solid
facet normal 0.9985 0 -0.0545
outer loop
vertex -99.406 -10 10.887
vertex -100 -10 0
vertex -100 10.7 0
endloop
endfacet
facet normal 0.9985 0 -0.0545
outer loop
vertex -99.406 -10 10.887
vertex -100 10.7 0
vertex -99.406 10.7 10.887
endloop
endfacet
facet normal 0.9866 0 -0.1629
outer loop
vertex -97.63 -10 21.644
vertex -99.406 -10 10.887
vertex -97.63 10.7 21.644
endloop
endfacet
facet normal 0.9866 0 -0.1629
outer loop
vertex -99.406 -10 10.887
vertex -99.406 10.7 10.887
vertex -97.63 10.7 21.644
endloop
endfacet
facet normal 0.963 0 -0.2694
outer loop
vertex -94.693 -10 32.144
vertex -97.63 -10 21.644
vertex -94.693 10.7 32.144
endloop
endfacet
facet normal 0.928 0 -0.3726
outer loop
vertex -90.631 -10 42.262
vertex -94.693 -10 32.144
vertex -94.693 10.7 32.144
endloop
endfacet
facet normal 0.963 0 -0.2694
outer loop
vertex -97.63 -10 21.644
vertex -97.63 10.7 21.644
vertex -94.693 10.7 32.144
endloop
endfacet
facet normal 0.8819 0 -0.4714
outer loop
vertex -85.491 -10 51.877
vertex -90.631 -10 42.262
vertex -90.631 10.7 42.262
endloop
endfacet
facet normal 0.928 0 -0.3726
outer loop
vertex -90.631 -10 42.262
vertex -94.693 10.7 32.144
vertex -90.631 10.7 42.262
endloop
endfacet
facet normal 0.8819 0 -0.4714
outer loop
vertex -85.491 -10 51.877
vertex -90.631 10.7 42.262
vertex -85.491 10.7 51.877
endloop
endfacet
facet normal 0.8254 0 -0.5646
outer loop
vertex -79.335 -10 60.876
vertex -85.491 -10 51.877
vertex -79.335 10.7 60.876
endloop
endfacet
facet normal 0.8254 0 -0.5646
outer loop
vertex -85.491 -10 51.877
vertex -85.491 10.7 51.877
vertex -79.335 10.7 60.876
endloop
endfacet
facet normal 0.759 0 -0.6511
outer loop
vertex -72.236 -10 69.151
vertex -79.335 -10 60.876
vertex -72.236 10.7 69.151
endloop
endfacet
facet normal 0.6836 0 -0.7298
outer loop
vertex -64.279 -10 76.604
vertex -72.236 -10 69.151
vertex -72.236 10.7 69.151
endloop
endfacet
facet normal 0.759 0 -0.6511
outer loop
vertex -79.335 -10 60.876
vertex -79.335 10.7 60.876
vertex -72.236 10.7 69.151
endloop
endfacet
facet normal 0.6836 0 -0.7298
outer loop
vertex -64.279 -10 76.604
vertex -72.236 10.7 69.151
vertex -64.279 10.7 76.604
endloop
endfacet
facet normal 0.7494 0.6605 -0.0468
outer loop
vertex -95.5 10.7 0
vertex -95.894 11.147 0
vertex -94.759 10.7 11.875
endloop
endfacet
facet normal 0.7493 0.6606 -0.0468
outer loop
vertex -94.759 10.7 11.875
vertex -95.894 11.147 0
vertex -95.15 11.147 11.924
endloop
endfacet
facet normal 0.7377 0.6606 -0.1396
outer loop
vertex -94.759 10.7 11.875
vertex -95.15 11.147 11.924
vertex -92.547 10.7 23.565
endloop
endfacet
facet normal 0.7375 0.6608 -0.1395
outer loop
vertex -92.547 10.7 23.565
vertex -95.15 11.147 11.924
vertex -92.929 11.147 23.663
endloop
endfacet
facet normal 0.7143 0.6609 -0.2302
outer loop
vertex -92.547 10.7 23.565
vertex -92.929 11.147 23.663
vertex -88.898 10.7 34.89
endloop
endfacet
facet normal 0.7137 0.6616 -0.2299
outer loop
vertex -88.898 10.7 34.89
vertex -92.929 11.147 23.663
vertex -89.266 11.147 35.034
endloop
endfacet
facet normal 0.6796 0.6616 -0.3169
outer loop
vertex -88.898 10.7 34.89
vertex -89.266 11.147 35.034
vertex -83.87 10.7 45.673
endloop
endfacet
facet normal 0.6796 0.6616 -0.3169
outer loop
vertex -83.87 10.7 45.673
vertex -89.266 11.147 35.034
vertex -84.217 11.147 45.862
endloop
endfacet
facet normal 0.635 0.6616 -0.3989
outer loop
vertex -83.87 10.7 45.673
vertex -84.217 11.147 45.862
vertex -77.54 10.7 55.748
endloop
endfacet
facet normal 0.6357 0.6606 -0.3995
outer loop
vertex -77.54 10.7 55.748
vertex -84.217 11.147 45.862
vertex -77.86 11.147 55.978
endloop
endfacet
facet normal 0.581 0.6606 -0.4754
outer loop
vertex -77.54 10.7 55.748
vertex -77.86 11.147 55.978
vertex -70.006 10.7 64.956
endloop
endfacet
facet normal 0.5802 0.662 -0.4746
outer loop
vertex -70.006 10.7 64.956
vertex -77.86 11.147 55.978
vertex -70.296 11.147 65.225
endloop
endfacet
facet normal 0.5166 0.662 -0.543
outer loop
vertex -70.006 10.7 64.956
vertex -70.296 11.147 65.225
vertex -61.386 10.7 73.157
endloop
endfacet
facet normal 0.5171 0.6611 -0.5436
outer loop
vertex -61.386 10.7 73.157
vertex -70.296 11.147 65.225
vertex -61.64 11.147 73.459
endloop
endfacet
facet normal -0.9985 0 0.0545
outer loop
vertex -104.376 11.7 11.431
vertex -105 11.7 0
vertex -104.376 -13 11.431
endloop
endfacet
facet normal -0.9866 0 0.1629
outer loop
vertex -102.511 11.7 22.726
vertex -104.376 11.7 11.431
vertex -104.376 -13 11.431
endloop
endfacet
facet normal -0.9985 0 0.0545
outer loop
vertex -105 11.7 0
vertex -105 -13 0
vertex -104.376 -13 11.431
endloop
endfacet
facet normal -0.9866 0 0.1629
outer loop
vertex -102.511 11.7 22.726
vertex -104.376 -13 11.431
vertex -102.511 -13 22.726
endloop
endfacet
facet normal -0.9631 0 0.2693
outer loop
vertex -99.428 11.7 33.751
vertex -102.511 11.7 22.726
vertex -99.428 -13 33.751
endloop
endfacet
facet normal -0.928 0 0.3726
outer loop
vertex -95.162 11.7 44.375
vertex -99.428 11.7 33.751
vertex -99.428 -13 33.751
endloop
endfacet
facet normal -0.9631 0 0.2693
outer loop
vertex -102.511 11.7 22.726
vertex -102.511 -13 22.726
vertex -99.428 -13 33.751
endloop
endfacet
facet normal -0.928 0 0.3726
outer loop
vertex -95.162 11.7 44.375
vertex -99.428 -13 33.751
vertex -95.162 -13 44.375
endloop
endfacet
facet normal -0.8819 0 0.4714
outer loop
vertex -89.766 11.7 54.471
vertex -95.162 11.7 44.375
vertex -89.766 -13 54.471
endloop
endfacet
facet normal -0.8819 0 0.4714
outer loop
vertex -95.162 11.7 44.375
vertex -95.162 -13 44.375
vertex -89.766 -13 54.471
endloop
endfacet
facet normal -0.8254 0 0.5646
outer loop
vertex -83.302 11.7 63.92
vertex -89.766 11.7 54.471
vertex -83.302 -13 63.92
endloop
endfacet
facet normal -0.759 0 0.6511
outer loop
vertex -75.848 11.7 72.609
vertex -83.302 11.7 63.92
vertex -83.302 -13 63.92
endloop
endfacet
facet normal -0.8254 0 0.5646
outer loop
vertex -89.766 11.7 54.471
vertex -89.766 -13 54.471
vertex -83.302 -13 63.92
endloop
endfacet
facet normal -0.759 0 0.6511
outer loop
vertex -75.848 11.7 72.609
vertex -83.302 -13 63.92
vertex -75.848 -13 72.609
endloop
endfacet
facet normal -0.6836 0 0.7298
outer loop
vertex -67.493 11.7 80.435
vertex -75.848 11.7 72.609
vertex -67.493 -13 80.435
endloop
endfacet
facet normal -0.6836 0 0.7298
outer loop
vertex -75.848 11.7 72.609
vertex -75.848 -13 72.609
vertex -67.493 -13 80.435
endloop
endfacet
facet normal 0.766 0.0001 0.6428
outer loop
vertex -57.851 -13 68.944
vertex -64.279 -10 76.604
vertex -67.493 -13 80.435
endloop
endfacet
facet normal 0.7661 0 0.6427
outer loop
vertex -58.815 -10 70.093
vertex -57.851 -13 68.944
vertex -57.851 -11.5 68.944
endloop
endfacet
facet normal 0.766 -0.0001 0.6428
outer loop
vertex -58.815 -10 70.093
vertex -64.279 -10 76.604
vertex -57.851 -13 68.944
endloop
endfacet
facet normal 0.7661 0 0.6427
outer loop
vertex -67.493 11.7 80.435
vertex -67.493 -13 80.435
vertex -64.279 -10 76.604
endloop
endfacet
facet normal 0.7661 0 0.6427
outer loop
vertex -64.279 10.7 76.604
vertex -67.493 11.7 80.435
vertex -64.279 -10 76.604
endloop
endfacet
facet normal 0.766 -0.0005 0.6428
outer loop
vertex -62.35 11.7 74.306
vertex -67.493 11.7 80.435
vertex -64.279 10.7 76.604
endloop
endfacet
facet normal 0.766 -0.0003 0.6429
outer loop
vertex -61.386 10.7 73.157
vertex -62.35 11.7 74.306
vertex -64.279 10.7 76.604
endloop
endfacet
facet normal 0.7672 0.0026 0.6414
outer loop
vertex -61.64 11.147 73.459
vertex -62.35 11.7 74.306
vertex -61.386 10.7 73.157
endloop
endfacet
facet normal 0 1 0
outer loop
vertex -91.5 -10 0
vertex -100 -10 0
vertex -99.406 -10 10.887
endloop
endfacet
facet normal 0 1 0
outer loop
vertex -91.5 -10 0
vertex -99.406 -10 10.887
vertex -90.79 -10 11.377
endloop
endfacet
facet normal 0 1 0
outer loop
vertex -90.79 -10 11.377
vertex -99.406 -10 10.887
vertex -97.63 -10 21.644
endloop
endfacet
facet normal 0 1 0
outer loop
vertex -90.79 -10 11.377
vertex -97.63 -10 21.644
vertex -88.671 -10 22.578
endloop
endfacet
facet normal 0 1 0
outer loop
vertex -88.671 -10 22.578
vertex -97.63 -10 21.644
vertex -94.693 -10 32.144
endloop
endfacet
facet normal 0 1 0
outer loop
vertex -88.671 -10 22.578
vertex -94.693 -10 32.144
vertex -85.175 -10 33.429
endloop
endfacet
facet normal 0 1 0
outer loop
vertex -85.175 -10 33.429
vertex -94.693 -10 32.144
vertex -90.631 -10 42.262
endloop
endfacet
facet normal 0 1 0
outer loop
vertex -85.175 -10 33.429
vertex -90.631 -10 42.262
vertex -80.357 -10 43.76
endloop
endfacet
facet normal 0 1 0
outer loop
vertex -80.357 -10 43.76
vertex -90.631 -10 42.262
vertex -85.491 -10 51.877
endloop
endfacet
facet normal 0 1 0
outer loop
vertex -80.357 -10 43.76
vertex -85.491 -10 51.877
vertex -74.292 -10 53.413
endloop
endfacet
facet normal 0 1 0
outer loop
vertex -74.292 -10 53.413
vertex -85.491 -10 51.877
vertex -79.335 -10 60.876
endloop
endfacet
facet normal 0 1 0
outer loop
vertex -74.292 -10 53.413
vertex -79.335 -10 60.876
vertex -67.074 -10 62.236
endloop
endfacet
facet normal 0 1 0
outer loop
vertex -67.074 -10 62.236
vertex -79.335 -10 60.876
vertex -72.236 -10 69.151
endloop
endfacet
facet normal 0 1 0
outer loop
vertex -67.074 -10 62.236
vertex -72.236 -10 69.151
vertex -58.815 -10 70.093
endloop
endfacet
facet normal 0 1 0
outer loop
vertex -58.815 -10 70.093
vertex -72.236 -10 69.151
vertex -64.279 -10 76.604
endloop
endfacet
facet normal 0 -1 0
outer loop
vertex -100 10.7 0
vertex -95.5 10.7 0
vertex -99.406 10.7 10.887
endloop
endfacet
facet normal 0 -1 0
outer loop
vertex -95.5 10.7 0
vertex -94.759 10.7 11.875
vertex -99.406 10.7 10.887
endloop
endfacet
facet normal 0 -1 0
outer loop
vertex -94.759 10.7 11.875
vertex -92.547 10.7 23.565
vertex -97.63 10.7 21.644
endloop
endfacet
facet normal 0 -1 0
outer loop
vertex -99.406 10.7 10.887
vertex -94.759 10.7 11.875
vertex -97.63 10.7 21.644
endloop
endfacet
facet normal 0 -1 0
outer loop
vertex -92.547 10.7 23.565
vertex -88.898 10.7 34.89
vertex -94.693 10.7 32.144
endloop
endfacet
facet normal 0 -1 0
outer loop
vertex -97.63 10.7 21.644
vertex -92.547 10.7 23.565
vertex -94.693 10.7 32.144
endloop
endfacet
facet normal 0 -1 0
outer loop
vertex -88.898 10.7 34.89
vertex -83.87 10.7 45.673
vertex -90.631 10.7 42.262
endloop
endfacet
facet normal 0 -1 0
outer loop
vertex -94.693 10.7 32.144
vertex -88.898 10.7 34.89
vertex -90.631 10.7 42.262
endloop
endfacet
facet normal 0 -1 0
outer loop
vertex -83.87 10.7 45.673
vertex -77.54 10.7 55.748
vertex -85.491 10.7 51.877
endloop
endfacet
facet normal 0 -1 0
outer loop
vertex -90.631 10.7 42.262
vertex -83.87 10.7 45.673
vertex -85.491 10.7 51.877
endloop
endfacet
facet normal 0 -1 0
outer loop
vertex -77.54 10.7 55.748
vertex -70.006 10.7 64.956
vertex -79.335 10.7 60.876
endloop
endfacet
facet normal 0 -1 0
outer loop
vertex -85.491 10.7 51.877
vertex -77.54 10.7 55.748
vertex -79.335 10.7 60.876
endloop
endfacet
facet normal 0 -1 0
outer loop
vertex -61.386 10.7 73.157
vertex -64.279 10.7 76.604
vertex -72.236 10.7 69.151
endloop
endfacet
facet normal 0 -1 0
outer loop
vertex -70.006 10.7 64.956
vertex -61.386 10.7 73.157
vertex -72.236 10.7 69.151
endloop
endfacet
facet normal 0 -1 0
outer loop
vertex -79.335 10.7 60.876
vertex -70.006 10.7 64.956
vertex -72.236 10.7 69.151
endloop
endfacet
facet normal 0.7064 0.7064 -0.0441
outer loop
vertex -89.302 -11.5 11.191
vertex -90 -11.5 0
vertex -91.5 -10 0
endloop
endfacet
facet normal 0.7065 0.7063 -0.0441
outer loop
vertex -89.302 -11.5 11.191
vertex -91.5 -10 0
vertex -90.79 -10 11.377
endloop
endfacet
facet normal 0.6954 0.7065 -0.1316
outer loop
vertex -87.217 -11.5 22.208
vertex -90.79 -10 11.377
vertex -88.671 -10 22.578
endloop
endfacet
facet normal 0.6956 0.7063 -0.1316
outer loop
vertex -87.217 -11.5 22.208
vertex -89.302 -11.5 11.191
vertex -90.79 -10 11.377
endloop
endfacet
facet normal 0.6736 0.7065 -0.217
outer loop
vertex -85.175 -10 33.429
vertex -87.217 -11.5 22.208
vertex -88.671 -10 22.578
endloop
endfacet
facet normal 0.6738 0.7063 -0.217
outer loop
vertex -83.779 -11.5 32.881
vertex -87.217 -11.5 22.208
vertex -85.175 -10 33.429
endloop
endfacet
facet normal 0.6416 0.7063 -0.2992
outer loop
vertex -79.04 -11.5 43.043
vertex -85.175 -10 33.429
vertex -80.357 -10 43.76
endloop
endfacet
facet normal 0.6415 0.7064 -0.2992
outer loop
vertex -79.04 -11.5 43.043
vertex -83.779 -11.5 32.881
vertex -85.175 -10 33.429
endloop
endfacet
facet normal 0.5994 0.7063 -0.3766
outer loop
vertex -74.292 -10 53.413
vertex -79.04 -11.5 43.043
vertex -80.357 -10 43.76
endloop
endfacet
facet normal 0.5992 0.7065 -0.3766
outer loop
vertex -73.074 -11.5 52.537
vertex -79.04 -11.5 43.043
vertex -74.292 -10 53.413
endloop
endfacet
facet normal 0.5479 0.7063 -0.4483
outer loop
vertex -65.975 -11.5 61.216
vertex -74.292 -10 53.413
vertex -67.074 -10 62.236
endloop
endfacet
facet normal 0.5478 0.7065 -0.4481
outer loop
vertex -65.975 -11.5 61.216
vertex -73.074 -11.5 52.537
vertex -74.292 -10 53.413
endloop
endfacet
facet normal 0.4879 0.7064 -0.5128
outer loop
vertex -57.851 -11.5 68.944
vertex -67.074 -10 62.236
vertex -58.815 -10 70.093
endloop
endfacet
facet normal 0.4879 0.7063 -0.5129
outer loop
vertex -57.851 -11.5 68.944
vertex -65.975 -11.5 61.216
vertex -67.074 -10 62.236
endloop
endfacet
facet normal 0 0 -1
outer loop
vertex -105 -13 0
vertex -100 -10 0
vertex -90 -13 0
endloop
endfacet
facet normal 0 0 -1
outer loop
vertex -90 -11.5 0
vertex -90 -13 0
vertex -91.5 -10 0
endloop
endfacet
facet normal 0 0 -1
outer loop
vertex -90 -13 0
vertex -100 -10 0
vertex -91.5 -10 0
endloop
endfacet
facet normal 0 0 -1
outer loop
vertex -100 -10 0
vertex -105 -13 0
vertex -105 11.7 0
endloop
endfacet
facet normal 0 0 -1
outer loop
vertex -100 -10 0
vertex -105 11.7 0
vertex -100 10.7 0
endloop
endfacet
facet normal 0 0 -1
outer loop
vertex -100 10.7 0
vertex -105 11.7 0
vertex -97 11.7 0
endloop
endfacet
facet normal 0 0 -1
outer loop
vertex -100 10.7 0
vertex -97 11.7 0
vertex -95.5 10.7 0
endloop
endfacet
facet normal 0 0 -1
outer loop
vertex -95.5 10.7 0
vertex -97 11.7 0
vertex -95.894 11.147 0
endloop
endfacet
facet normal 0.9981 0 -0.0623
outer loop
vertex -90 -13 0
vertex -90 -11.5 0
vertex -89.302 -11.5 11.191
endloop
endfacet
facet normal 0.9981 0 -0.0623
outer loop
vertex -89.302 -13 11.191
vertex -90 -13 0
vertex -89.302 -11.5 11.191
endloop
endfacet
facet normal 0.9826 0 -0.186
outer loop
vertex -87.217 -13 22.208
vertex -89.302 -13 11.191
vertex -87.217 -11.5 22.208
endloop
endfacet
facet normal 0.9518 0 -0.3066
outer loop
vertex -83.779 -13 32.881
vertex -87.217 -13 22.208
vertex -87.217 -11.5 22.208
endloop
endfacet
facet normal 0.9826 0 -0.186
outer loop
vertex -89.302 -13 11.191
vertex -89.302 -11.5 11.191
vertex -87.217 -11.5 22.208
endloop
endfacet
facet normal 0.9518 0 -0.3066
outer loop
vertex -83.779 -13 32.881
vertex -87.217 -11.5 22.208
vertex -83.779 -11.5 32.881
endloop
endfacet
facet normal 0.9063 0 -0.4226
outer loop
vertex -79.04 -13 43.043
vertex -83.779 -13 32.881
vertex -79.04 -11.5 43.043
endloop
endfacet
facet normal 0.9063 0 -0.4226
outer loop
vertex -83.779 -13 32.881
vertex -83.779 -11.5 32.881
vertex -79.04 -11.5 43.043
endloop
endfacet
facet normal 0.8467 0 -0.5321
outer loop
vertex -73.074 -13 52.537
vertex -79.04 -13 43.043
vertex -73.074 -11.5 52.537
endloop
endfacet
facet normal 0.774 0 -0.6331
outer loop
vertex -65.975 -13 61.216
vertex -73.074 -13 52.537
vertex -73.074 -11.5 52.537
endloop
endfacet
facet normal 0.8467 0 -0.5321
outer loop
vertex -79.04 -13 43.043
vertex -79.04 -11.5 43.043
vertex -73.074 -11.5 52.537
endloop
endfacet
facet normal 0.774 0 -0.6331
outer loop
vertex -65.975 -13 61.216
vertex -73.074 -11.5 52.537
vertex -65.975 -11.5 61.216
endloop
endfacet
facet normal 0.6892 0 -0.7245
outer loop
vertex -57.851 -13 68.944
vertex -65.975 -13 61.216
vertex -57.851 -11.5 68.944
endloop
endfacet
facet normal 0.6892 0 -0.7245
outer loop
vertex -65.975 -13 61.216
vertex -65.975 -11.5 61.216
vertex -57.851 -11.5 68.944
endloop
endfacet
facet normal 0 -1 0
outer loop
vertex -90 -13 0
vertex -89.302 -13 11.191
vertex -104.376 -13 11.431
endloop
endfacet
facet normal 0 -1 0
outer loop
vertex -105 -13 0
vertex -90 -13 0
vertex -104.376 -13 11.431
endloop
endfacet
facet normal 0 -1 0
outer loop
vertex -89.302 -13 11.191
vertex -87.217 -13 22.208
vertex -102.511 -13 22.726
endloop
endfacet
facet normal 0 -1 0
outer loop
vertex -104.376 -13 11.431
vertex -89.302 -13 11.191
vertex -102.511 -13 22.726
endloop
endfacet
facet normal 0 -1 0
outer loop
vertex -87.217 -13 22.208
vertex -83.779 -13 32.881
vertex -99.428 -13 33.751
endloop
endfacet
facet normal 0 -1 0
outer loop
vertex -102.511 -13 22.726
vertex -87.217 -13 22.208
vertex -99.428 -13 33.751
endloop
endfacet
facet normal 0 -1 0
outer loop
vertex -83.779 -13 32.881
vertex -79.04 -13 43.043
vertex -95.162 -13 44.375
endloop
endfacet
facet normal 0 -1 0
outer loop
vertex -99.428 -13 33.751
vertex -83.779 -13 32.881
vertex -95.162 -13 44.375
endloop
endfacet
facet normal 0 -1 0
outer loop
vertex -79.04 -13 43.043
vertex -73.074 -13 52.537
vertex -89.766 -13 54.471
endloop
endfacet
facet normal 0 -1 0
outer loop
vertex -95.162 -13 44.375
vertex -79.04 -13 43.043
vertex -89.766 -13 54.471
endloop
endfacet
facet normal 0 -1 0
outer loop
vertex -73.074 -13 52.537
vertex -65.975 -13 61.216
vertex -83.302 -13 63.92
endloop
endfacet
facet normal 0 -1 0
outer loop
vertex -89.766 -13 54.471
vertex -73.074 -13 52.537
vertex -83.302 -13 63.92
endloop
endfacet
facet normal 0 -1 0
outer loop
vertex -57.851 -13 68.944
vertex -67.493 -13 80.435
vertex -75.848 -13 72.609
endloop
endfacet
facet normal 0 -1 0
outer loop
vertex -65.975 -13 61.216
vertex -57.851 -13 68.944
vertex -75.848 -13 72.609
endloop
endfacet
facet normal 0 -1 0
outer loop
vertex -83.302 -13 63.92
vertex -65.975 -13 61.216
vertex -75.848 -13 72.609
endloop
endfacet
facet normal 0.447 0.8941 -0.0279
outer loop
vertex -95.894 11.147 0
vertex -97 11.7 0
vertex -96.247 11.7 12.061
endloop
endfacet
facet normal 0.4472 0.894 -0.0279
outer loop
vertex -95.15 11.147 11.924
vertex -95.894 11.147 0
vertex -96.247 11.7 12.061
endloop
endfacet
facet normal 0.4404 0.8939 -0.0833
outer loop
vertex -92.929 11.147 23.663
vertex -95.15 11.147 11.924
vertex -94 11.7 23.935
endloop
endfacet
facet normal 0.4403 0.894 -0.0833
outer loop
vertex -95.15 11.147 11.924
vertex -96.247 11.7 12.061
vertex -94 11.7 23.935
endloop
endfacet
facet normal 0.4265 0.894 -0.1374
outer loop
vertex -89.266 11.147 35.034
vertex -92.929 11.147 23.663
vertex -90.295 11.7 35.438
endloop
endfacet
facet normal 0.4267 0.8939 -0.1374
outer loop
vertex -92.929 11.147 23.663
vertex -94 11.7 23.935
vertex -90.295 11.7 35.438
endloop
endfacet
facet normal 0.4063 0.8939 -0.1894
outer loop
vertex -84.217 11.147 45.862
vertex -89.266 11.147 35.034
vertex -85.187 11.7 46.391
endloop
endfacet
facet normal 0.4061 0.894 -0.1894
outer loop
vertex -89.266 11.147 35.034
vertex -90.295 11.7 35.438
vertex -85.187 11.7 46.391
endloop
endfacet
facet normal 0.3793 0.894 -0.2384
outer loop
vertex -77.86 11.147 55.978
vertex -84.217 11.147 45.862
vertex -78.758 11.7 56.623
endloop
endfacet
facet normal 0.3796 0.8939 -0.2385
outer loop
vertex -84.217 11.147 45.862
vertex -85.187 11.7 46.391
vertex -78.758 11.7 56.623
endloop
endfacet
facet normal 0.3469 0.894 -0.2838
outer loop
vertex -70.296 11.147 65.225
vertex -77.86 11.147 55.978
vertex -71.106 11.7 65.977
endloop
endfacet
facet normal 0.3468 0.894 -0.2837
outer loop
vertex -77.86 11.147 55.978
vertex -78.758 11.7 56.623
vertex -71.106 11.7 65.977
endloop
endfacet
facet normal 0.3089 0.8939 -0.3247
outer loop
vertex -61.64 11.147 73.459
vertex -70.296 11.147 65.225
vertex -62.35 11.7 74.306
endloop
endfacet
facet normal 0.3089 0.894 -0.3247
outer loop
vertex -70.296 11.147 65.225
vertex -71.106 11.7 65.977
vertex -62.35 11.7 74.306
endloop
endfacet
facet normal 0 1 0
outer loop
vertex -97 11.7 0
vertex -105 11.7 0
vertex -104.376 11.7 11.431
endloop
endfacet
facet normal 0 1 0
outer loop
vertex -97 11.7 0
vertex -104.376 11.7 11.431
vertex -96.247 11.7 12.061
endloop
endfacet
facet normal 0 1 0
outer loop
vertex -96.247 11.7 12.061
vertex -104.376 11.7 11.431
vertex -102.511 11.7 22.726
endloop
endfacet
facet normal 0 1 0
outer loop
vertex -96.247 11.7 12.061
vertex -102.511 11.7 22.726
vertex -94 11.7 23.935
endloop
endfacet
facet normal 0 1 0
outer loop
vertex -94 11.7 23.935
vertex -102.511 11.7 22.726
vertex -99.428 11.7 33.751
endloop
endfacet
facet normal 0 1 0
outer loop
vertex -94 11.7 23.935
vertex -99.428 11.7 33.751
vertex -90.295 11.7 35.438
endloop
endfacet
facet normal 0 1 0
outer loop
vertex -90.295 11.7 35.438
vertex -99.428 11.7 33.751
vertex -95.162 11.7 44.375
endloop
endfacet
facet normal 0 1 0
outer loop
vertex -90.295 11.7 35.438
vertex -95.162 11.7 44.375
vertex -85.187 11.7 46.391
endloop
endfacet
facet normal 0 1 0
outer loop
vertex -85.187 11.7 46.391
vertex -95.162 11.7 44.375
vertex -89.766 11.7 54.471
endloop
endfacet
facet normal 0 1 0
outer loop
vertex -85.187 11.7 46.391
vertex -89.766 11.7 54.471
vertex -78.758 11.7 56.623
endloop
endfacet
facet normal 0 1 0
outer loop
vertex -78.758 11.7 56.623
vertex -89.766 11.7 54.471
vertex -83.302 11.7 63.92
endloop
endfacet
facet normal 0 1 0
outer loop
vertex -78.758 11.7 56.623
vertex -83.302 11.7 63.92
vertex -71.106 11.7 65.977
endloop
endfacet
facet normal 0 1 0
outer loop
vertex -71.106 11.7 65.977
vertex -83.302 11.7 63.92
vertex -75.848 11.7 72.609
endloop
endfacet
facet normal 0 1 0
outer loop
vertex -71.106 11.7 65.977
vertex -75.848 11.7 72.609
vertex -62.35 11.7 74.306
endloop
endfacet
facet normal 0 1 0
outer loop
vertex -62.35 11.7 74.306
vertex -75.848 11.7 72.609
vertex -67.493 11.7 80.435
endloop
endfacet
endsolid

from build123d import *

# Parameters (mm, degrees)
F1_ANGLE    = 50
F2_SIZE     = 1.5
F3_T2_ANGLE = 53.1281028161


# Not quite as in the source:
# - a fillet or chamfer that OpenCascade refuses, or shapes differently, is made with other operations: its cross-section is extruded or revolved along the edge and cut away or added


with BuildPart() as f1:
    # F0 (on Top) → F1 (revolve)
    with BuildSketch(Plane.XY):
        Polygon((-90, -10), (-100, -10), (-100, 10.7), (-95, 10.7), (-97, 11.7), (-105, 11.7), (-105, -13), (-90, -13), align=None)
    revolve(axis=Axis((0, 3.89609579, 0), (0, 1, 0)), revolution_arc=F1_ANGLE)

    # F2
    f2_edges = [f1.edges().sort_by_distance(p)[0] for p in [
        (-81.567701, -10, 38.035644),
    ]]
    chamfer(f2_edges, length=F2_SIZE)

    # F3: chamfer of 1 x 0.5 on 1 edges, made by hand

    # F3_s1 → F3_t2 (revolve, cut)
    with BuildSketch(Plane(origin=(0, 0, 0), x_dir=(0, 1, 0), z_dir=(0.0272944566, 0, -0.9996274369))):
        Polygon((10.7, -95.5), (11.1472135955, -95.894427191), (10.7, -95), align=None)
    revolve(axis=Axis((0, 10.7, 0), (0, 1, 0)), revolution_arc=F3_T2_ANGLE, mode=Mode.SUBTRACT)


solid = f1.part
